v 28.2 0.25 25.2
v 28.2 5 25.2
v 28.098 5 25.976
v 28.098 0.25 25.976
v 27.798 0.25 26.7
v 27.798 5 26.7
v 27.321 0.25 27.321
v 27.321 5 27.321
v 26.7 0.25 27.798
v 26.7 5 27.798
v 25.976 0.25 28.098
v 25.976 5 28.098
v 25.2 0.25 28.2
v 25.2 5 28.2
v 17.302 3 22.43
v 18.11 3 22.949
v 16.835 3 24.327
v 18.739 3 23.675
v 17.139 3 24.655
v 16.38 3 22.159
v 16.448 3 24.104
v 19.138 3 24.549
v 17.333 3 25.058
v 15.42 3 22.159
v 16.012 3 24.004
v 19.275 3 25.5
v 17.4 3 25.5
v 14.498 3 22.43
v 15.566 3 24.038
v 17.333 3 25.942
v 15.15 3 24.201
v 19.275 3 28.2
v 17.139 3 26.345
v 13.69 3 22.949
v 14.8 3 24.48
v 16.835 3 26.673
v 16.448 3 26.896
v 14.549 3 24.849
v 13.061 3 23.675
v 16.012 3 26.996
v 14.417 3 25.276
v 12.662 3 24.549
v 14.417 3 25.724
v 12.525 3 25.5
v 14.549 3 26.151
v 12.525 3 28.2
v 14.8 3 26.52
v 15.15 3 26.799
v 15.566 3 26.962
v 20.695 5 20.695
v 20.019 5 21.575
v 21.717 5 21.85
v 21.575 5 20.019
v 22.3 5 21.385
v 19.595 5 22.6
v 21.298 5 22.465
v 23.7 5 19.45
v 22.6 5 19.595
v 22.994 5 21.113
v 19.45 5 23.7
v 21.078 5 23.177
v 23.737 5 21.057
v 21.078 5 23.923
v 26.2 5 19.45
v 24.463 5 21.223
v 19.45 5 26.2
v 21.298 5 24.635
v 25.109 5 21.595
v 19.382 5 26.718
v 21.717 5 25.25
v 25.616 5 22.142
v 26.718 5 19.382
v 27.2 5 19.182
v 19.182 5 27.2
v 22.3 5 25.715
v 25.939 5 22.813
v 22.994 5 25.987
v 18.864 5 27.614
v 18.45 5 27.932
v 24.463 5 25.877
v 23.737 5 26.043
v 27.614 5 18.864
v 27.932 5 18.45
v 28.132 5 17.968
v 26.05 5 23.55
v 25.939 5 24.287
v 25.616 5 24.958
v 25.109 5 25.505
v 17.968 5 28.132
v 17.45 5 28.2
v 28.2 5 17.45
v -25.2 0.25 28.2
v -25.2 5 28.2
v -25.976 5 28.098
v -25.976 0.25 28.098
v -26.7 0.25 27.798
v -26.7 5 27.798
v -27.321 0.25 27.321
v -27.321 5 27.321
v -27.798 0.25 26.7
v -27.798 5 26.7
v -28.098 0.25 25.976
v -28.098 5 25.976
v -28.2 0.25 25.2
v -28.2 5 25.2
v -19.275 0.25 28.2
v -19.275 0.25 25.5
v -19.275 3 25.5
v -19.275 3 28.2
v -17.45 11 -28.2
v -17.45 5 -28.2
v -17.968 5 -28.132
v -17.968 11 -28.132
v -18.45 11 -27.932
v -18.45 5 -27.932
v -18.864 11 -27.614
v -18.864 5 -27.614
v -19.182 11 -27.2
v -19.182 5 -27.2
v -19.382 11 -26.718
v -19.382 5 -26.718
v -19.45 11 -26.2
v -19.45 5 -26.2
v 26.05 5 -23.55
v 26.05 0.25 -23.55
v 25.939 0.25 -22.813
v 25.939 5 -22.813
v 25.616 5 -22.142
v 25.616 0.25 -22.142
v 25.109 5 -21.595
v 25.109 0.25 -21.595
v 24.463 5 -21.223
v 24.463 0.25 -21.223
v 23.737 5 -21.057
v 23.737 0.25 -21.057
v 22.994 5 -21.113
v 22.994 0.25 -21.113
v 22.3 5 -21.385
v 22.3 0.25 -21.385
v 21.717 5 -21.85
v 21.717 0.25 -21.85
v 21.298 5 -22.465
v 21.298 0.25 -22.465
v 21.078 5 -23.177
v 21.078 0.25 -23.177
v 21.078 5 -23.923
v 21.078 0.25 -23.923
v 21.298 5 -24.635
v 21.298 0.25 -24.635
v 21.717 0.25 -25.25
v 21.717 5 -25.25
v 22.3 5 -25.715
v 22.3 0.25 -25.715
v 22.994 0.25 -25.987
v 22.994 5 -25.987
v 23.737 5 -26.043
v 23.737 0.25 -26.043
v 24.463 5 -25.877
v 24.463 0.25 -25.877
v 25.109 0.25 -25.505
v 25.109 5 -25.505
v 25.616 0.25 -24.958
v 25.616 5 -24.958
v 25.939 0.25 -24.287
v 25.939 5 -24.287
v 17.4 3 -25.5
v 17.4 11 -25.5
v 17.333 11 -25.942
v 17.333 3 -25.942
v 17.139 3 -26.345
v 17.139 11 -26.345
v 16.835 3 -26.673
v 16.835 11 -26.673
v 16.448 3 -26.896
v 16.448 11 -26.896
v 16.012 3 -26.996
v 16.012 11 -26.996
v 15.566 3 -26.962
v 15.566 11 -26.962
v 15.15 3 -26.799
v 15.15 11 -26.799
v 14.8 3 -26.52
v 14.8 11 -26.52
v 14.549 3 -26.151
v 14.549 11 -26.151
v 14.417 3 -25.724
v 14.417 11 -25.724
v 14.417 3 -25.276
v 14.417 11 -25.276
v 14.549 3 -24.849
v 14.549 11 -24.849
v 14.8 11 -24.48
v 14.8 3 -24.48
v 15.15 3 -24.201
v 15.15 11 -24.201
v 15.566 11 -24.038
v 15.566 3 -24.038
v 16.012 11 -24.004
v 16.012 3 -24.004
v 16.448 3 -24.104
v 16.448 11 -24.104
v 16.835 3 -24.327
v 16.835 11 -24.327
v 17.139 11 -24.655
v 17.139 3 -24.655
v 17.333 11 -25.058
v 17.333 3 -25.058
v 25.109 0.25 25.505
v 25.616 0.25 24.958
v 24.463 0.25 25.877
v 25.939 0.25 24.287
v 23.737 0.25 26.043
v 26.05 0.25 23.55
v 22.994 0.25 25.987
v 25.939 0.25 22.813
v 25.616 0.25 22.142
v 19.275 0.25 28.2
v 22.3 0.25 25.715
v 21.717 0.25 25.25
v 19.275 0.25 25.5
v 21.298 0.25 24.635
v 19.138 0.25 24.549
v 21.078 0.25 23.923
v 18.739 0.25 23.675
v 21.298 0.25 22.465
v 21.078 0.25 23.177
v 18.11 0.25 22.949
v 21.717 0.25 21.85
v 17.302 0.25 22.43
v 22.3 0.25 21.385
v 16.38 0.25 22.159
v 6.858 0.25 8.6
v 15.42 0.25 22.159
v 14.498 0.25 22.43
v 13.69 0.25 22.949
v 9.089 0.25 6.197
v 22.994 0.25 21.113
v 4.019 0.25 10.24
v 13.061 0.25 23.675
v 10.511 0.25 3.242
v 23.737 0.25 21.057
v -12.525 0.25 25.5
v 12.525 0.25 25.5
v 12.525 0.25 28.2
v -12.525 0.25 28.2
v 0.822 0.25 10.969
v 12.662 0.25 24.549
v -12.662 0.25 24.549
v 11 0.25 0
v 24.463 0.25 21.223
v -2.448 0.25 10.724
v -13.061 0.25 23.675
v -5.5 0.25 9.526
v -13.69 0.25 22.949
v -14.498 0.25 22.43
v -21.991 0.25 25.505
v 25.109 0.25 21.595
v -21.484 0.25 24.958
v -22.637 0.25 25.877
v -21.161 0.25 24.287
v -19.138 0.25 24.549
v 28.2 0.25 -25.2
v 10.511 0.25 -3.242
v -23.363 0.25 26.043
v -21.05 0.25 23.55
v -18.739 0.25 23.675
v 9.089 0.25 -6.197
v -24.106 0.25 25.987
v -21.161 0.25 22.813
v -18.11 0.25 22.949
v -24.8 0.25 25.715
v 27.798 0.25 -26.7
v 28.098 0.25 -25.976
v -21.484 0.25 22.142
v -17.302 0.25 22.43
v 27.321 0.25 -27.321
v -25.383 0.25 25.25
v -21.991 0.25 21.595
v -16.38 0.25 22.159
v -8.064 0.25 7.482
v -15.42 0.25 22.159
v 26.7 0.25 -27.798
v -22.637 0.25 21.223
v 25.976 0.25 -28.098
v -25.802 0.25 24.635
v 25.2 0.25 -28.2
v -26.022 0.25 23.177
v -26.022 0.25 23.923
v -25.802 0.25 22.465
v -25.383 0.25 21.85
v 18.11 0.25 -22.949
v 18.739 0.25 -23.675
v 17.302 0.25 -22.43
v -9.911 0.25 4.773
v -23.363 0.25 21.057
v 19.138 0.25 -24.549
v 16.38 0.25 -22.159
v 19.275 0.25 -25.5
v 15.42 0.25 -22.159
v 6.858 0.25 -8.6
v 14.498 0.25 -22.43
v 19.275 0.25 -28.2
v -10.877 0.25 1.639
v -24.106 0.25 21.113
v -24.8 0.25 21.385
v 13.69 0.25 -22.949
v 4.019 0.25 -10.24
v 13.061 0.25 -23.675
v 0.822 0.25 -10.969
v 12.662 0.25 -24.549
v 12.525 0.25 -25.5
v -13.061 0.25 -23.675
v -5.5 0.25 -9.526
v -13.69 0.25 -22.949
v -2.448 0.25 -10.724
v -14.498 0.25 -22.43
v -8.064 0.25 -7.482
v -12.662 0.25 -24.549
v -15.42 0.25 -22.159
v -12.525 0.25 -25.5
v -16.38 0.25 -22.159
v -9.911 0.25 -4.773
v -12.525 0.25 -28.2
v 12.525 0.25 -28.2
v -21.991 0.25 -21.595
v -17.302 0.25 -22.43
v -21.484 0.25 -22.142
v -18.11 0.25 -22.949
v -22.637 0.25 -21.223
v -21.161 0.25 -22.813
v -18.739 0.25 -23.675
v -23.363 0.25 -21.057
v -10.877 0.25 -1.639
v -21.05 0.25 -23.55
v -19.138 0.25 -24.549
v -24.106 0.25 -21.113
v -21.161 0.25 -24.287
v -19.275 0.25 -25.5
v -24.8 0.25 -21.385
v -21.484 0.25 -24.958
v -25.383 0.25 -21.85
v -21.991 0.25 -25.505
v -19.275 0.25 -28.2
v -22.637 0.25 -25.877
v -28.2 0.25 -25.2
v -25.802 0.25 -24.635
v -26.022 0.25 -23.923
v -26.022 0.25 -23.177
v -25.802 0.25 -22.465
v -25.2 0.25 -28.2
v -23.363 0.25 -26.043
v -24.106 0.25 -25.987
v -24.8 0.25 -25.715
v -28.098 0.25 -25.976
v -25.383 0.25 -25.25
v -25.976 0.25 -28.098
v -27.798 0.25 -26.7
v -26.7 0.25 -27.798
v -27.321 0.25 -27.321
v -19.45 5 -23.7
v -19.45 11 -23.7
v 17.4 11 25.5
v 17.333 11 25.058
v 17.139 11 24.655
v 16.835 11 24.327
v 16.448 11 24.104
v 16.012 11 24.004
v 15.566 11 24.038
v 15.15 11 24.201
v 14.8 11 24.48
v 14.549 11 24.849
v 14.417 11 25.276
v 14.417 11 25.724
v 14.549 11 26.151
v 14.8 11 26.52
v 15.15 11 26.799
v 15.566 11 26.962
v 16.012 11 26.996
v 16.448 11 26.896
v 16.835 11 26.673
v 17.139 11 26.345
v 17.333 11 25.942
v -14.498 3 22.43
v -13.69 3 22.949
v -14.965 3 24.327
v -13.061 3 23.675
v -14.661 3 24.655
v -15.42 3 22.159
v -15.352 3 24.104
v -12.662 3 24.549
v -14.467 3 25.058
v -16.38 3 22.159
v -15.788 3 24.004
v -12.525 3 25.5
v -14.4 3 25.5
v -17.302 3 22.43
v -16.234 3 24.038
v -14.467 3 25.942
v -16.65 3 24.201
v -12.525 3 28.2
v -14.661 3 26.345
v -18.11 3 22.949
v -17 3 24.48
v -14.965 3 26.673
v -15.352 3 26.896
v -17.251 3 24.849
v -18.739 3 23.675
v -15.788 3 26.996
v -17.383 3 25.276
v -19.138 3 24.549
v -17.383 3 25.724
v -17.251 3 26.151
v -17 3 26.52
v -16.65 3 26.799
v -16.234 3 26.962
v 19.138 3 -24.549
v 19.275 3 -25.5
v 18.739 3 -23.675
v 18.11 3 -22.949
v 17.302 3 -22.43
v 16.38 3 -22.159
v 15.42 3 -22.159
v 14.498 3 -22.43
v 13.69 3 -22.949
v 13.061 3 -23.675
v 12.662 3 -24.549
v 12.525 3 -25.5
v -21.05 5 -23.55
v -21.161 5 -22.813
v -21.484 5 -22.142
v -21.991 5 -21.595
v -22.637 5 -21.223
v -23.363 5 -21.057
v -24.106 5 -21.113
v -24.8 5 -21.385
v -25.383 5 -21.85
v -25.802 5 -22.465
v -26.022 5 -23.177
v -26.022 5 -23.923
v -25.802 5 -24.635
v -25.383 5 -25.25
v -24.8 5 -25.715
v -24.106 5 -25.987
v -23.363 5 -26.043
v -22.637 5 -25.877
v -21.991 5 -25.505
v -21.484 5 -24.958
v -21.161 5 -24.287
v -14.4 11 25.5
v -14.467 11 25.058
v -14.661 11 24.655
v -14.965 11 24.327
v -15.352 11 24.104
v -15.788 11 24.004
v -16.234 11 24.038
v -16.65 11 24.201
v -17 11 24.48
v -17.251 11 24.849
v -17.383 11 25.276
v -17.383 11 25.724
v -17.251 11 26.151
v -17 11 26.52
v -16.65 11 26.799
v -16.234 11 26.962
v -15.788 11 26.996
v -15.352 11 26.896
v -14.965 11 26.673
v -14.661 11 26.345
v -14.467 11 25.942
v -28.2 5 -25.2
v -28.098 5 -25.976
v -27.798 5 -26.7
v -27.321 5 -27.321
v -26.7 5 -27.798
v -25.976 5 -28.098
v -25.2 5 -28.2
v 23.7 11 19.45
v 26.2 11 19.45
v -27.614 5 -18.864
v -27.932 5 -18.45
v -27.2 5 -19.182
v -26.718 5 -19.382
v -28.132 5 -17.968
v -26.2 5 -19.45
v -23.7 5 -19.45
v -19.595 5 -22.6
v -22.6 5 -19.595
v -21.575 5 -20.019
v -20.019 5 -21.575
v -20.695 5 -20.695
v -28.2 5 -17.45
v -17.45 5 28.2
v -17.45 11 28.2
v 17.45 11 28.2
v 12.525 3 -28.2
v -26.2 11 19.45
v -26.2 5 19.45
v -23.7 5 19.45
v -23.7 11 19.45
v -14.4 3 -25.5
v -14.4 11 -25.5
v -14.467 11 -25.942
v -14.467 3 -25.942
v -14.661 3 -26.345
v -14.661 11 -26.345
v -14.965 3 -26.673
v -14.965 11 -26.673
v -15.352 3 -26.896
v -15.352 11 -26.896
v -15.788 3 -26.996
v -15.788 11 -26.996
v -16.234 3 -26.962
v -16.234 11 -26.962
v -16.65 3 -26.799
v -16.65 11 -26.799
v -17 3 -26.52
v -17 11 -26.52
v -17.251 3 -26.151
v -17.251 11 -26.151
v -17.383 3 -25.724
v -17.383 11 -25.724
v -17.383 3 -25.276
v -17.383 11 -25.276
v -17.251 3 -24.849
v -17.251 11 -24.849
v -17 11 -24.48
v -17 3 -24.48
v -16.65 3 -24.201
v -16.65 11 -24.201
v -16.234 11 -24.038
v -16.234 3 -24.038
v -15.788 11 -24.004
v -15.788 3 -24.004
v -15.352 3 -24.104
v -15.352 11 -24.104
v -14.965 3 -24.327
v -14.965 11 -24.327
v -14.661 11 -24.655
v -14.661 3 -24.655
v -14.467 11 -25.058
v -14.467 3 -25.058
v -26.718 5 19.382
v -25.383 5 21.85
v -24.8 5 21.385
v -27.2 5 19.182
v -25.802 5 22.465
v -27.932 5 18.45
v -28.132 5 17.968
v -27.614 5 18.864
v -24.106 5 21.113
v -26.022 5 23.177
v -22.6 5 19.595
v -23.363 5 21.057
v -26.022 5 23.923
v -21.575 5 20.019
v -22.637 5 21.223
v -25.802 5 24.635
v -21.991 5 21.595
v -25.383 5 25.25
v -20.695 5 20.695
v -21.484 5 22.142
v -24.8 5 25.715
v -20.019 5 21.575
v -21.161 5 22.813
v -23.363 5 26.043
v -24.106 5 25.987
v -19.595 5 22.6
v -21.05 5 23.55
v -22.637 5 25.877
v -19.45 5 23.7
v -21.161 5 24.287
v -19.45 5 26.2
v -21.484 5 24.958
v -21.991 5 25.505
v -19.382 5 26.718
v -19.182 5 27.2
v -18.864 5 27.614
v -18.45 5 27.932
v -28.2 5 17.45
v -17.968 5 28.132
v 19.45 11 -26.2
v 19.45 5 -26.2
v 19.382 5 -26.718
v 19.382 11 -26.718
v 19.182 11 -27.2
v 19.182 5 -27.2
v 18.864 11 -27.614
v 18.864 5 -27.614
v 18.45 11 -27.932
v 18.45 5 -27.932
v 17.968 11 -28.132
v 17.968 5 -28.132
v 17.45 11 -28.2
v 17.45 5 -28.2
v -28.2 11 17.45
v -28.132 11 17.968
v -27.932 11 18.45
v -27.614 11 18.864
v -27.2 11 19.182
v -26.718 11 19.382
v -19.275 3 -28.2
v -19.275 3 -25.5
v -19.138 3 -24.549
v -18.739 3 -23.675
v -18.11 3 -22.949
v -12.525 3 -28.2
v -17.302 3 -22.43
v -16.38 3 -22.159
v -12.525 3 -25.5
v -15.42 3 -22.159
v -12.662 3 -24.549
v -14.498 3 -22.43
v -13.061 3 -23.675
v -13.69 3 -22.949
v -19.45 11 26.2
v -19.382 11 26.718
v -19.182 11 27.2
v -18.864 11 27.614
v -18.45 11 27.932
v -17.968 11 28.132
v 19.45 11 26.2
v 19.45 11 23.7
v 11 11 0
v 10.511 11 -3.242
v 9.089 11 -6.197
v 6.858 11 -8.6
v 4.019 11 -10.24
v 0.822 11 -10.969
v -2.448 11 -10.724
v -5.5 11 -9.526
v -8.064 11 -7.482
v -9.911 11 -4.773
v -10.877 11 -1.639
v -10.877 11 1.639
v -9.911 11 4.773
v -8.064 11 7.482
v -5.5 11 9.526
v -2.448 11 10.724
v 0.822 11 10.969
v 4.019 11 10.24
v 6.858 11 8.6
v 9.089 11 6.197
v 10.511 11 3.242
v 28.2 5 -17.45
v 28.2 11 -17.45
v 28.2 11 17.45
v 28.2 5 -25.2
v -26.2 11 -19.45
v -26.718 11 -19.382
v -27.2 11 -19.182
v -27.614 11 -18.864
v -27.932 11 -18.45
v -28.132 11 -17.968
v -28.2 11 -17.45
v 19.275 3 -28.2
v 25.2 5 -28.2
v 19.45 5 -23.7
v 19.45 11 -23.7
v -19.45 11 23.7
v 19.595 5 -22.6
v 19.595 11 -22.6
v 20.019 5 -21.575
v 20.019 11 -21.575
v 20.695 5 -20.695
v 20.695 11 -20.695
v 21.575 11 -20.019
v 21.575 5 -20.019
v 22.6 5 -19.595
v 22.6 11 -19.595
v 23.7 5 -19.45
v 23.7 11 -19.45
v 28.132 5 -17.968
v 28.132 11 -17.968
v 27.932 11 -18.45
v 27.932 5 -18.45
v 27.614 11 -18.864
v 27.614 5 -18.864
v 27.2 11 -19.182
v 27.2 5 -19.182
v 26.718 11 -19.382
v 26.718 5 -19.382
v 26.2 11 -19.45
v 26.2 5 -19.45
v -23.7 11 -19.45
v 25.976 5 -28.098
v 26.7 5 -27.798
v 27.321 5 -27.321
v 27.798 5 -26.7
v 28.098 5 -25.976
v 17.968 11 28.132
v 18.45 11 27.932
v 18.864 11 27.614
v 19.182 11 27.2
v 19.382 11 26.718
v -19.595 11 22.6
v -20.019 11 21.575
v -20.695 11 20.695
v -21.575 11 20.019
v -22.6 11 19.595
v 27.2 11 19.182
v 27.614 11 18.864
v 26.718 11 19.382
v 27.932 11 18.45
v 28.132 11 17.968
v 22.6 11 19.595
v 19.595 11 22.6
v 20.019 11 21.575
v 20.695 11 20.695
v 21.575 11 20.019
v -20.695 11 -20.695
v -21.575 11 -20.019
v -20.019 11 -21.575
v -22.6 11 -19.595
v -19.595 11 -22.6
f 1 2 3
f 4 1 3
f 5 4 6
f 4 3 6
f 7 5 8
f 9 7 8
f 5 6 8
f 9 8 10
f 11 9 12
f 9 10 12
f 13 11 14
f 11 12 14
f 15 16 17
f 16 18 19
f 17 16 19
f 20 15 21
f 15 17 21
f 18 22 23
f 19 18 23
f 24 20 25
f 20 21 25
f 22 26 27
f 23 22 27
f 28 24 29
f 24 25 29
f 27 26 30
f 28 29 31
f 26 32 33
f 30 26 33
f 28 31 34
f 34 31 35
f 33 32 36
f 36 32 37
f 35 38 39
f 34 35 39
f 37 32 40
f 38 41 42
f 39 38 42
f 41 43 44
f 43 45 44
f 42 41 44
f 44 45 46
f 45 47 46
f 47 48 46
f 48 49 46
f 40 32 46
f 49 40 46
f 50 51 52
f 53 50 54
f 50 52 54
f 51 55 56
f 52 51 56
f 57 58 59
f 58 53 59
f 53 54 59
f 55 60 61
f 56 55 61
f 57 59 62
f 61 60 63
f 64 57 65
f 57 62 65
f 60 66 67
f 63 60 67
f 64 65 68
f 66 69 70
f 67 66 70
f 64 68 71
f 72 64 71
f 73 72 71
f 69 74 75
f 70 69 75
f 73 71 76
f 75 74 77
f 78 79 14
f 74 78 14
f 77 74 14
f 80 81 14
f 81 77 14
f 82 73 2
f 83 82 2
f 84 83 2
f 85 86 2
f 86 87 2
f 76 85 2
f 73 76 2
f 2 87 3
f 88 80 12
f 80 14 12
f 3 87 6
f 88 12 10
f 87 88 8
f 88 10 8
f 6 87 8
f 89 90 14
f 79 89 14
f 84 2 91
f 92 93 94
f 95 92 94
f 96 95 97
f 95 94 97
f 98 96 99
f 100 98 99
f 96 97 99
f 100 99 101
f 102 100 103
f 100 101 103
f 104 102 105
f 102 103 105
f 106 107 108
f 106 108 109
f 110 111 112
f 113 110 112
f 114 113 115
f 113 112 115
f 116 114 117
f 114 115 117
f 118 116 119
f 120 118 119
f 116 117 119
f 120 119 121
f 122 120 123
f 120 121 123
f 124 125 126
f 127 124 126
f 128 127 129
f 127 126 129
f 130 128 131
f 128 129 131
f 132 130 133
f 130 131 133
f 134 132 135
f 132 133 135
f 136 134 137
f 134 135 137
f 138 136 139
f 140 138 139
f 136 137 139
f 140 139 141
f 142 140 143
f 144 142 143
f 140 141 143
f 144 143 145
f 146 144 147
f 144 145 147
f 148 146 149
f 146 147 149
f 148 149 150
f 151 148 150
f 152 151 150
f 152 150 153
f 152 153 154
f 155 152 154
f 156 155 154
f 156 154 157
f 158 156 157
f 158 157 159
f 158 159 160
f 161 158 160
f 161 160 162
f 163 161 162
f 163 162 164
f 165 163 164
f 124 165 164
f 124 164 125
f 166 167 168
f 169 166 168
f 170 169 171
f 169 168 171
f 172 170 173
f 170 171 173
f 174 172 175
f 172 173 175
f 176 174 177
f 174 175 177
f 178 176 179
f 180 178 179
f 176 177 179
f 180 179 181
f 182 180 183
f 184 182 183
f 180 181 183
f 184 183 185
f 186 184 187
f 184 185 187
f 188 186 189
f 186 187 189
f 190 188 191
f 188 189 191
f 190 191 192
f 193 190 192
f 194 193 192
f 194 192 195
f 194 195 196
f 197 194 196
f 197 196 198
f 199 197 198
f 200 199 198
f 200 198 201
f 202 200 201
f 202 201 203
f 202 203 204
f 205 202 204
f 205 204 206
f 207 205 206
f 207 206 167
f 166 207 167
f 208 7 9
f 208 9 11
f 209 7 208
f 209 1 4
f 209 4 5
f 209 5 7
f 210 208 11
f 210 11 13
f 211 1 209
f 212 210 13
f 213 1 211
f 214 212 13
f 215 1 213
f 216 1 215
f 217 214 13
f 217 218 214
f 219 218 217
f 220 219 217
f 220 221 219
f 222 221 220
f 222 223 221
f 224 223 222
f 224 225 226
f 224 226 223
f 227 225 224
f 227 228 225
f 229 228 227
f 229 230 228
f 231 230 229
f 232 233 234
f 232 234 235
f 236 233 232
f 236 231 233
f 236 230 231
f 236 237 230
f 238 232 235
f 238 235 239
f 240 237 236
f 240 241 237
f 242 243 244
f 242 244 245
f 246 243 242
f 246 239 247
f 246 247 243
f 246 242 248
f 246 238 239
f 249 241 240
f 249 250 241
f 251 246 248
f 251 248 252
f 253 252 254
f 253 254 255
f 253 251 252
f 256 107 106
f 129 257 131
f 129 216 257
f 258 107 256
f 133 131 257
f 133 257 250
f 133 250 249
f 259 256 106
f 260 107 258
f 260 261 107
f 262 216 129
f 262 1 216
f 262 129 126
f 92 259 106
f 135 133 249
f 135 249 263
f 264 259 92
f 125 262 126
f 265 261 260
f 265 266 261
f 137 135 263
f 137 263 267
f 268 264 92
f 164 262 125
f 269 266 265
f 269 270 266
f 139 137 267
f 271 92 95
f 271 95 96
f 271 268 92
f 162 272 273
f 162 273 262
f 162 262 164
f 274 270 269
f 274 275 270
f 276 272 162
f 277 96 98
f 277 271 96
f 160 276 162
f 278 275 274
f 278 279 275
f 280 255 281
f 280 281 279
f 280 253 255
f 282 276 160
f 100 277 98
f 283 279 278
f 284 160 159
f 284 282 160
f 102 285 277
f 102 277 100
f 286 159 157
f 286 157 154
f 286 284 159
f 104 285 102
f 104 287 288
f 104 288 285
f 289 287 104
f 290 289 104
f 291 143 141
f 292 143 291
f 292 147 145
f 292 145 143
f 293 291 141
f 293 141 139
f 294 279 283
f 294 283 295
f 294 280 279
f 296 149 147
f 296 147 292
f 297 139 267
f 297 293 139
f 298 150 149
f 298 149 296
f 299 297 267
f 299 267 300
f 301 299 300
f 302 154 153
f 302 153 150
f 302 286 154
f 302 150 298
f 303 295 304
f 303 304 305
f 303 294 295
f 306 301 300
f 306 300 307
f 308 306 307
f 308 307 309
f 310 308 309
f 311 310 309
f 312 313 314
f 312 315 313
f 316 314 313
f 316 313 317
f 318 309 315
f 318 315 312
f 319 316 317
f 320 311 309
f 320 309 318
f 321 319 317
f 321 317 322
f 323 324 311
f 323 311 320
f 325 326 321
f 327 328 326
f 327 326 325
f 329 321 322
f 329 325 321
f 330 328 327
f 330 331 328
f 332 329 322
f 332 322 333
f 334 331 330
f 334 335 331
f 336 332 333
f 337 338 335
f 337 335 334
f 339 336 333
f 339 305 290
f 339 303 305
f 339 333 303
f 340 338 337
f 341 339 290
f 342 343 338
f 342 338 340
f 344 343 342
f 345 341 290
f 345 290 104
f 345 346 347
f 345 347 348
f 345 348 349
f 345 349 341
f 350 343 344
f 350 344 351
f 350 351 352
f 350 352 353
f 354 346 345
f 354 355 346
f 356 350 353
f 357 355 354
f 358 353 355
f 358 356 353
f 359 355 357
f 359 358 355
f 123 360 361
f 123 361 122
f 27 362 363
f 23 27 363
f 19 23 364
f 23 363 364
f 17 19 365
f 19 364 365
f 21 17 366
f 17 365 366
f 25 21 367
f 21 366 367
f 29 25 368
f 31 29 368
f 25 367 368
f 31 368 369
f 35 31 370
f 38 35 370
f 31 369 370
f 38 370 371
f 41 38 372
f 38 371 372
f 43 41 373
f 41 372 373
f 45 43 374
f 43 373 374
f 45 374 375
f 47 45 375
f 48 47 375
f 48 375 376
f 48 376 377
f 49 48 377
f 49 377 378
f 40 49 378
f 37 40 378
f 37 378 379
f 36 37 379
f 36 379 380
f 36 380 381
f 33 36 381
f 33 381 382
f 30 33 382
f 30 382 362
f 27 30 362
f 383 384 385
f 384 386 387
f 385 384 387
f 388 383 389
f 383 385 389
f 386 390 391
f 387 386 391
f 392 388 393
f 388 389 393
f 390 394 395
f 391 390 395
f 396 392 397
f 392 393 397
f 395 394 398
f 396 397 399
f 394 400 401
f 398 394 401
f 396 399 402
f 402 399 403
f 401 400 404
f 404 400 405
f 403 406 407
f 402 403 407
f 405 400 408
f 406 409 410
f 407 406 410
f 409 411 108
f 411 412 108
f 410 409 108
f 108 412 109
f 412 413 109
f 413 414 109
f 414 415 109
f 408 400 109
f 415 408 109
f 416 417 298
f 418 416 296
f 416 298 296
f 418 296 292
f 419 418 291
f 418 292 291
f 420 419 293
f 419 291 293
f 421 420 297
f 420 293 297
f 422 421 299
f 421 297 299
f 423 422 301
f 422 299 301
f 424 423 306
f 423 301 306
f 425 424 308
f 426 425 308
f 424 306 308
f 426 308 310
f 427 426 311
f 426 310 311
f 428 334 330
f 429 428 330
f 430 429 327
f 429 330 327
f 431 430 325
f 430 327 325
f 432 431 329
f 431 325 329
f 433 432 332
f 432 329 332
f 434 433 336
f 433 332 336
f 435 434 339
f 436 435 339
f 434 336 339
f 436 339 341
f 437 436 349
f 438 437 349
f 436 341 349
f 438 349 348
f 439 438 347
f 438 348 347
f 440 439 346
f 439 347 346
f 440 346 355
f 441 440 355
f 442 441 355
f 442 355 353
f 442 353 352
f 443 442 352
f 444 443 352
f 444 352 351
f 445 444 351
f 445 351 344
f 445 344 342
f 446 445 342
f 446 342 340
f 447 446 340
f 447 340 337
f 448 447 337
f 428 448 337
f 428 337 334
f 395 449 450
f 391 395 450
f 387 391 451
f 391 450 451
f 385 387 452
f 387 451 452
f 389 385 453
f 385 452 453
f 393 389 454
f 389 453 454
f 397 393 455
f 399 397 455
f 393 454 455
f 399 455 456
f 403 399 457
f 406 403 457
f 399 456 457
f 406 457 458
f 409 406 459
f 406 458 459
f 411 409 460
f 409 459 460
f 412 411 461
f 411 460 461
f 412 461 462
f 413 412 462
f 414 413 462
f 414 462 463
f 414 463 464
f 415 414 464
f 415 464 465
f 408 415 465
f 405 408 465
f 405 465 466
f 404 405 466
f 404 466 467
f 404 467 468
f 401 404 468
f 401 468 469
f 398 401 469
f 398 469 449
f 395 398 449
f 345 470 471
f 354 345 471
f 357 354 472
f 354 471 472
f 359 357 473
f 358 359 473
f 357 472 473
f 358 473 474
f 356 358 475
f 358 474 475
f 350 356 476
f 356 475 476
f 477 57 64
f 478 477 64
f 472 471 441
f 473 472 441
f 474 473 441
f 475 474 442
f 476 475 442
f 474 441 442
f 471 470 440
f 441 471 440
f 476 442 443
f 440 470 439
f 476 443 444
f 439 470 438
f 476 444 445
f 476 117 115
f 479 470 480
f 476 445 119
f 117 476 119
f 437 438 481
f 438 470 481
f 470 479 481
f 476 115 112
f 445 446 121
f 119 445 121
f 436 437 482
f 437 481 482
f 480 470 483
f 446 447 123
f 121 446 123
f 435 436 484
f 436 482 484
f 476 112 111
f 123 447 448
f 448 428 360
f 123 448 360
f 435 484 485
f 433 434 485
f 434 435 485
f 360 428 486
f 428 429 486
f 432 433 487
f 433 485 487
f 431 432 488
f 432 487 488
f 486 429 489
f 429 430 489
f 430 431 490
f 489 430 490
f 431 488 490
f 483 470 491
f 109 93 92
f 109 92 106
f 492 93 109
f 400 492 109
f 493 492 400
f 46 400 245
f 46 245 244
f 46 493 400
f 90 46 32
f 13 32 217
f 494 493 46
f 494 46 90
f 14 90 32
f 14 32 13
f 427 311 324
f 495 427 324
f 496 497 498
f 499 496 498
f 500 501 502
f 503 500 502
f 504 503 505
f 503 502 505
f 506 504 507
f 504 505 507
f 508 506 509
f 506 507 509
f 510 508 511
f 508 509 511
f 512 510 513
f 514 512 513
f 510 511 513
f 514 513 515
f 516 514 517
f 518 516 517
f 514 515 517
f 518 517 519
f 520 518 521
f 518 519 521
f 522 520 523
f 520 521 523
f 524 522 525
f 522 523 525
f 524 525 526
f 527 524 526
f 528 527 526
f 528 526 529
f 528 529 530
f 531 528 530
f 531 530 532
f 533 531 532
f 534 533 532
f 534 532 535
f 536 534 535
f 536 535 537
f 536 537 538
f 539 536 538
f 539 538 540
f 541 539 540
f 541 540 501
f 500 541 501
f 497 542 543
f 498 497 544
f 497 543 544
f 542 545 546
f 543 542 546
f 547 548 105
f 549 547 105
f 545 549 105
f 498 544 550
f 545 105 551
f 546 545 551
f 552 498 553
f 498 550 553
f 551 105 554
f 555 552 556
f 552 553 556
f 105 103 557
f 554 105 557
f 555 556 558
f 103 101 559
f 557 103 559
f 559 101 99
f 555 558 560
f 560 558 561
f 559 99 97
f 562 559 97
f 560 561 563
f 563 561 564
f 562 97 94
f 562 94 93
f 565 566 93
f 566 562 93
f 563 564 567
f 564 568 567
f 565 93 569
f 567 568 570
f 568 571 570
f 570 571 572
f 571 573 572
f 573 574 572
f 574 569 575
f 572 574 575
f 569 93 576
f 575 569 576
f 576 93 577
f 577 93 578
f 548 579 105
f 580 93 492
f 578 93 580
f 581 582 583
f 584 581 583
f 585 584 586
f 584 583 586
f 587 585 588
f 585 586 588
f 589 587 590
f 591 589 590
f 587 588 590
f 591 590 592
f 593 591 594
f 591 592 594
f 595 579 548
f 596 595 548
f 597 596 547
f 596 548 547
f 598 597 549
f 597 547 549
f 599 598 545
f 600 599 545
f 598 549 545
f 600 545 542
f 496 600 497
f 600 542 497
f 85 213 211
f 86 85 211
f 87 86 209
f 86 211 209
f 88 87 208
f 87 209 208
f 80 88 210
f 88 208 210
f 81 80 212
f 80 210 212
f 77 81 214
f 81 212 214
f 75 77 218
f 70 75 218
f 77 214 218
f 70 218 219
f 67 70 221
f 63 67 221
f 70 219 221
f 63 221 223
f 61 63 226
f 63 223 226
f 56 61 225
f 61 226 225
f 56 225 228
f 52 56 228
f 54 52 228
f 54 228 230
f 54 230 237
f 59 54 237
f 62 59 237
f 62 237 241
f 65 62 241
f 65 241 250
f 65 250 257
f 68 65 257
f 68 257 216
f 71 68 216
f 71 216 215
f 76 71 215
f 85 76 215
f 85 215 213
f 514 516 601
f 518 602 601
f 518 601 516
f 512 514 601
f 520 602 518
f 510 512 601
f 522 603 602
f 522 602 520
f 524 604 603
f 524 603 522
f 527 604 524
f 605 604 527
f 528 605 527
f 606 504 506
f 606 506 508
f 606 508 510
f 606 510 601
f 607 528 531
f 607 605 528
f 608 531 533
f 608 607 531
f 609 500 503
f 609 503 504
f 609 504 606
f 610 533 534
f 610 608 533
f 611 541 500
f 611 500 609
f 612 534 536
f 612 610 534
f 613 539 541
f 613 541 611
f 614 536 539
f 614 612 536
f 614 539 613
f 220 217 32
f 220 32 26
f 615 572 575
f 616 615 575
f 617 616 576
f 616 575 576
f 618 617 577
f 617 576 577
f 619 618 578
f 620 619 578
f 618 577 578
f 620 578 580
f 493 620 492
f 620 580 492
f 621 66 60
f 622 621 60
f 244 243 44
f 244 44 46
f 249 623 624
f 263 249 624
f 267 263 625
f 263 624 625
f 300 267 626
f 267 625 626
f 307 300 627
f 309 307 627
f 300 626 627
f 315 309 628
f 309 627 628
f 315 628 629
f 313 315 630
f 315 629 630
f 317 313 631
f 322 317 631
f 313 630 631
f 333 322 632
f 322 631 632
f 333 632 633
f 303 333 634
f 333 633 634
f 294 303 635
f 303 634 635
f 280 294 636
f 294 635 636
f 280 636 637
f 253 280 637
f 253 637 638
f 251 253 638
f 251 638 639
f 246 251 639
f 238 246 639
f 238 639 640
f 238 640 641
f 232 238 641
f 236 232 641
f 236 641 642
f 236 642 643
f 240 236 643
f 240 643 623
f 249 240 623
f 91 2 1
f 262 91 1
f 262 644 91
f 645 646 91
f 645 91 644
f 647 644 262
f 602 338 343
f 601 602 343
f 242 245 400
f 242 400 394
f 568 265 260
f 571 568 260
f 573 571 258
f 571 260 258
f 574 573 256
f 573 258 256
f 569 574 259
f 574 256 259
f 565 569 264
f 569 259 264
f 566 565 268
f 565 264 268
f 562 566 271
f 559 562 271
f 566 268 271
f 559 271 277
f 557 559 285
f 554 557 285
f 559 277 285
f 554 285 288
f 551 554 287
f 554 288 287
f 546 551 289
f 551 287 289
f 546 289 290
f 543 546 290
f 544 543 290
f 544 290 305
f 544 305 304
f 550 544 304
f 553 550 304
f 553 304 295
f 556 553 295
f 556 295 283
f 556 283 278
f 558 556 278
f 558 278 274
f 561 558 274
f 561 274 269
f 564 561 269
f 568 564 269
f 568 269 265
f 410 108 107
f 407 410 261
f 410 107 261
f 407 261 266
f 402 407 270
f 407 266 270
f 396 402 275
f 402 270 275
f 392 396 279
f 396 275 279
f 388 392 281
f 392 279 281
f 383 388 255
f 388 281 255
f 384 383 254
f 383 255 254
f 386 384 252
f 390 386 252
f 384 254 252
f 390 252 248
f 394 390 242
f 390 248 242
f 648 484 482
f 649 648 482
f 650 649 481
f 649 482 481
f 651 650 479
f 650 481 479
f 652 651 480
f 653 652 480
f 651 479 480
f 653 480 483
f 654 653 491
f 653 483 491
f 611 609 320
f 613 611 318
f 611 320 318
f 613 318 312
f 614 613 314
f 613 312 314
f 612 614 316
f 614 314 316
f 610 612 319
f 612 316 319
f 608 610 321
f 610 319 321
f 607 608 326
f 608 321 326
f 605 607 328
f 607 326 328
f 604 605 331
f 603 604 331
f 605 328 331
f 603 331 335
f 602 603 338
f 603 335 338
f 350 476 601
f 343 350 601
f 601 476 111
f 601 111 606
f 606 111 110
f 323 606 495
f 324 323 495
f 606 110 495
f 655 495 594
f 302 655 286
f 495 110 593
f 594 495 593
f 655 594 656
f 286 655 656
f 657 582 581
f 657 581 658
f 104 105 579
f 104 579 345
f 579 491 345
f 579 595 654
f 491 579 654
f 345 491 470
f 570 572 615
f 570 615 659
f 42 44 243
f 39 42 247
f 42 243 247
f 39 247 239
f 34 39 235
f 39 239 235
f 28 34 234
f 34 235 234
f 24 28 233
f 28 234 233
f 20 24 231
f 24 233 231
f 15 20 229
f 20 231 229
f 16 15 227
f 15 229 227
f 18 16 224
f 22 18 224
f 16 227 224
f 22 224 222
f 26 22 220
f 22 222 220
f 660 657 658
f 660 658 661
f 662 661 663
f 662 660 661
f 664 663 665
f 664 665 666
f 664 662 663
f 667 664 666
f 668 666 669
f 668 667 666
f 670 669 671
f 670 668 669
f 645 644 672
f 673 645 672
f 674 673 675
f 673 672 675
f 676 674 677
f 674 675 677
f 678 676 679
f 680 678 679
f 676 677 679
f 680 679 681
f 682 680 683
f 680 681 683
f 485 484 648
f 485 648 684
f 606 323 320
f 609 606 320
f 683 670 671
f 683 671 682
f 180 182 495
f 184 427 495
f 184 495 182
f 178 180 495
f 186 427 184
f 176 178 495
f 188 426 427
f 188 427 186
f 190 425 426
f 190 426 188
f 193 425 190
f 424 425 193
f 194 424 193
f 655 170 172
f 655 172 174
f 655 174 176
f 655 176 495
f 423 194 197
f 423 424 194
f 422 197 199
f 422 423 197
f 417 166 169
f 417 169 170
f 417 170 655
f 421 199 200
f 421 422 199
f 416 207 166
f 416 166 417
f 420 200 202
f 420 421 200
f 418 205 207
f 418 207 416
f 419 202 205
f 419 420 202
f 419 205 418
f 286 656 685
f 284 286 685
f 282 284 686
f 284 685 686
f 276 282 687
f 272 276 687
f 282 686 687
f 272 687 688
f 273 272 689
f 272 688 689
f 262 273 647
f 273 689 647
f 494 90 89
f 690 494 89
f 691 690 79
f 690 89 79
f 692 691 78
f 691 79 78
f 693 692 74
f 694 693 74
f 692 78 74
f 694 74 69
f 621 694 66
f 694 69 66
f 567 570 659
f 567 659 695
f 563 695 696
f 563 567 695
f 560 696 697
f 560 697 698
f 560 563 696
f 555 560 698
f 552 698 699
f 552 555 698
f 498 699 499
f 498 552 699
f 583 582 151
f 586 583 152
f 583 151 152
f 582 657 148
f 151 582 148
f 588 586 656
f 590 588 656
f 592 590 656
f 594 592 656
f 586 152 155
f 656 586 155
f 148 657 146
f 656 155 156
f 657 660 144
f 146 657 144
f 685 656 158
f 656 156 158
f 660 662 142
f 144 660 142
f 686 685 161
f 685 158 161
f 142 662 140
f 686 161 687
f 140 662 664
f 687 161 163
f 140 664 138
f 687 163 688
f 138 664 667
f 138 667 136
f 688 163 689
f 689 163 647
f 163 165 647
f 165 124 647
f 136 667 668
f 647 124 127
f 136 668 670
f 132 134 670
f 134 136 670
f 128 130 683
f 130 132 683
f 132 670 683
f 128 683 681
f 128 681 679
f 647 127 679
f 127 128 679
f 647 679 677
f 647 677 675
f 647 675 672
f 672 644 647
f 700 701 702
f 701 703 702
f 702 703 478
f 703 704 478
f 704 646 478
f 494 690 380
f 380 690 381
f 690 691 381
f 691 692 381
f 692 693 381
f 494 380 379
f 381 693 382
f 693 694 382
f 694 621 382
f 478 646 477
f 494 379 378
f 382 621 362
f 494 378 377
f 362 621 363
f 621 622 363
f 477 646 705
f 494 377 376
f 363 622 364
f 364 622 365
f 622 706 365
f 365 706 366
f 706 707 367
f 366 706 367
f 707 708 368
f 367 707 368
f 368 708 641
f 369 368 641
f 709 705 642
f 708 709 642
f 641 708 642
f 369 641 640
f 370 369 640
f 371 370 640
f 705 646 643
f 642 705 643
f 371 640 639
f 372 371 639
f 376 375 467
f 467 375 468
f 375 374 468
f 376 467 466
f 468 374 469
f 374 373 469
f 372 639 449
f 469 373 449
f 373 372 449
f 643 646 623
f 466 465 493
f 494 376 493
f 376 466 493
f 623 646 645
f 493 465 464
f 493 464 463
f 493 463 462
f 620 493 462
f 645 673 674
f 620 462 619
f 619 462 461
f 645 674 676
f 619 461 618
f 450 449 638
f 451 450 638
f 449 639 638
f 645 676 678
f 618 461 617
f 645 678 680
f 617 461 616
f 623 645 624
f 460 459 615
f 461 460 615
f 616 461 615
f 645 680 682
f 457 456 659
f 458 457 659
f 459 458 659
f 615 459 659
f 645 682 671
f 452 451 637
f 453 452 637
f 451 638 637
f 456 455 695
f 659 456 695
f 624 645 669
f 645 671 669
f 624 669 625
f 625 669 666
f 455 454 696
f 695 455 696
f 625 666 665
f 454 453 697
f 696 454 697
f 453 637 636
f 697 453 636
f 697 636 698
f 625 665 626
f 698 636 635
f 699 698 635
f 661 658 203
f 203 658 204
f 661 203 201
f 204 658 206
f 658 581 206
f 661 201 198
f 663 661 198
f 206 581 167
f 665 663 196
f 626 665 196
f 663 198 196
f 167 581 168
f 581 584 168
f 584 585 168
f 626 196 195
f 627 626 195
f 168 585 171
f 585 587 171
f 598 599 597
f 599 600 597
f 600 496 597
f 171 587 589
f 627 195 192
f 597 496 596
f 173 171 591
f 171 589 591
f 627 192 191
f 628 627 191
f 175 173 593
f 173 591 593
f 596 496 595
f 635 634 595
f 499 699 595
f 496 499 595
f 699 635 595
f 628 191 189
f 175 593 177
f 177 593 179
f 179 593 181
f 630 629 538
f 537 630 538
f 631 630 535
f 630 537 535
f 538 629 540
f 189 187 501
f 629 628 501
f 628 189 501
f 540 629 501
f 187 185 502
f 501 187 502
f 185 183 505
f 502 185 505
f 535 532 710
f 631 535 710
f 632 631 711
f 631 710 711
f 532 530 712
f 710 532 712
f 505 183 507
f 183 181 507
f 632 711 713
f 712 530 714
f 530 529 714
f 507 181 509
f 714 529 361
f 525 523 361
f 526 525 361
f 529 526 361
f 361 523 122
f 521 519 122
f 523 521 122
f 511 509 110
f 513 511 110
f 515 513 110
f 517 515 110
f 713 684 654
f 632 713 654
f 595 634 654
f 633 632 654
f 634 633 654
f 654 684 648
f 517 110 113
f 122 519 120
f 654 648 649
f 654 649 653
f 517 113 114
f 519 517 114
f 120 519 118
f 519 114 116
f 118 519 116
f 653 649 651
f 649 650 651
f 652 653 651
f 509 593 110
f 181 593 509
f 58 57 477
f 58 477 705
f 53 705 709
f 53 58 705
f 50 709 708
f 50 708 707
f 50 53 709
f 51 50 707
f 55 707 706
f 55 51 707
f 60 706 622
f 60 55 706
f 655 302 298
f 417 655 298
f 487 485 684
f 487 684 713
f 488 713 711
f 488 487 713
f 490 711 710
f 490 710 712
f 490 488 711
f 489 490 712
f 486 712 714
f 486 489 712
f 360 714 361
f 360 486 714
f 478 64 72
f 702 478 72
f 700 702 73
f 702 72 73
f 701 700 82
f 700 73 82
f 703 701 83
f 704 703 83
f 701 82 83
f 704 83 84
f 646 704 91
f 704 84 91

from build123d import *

# Parameters (mm, degrees)
SKETCH003_R          = 5.5
PAD002_DEPTH         = 6
SKETCH_R             = 5.5
PAD_DEPTH            = 5
SKETCH005_R          = 19.05
SKETCH005_R_2        = 5.5
PAD004_DEPTH         = 1.1
SKETCH006_R          = 2.5
POCKET_DEPTH         = 11.001
SKETCH007_R          = 1.5
POCKET001_DEPTH      = 12.101
POCKET004_DEPTH      = 3
SKETCH018_R          = 11
POCKET009_DEPTH      = 11
POCKET009_FACE32_R   = 2.5
POCKET009_FACE32_R_2 = 19.05
POCKET014_DEPTH      = 0.25
POCKET014_FACE62_R   = 19.05
POCKET014_FACE62_R_2 = 5.5
POCKET021_DEPTH      = 1.35


with BuildPart() as part:
    # Sketch003 → Pad002 (new body)
    with BuildSketch(Plane(origin=(0, 5, 0), x_dir=(1, 0, 0), z_dir=(0, 1, 0))):
        with BuildLine():
            Line((-26.2, 19.45), (-23.7, 19.45))
            ThreePointArc((-23.7, 19.45), (-20.694796, 20.694796), (-19.45, 23.7))
            Line((-19.45, 23.7), (-19.45, 26.2))
            ThreePointArc((-17.45, 28.2), (-18.864214, 27.614214), (-19.45, 26.2))
            Line((-17.45, 28.2), (17.45, 28.2))
            ThreePointArc((19.45, 26.2), (18.864214, 27.614214), (17.45, 28.2))
            Line((19.45, 26.2), (19.45, 23.7))
            ThreePointArc((19.45, 23.7), (20.694796, 20.694796), (23.7, 19.45))
            Line((23.7, 19.45), (26.2, 19.45))
            ThreePointArc((28.2, 17.45), (27.614214, 18.864214), (26.2, 19.45))
            Line((28.2, 17.45), (28.2, -17.45))
            ThreePointArc((26.2, -19.45), (27.614214, -18.864214), (28.2, -17.45))
            Line((23.7, -19.45), (26.2, -19.45))
            ThreePointArc((23.7, -19.45), (20.694796, -20.694796), (19.45, -23.7))
            Line((19.45, -26.2), (19.45, -23.7))
            ThreePointArc((17.45, -28.2), (18.864214, -27.614214), (19.45, -26.2))
            Line((-17.45, -28.2), (17.45, -28.2))
            ThreePointArc((-19.45, -26.2), (-18.864214, -27.614214), (-17.45, -28.2))
            Line((-19.45, -26.2), (-19.45, -23.7))
            ThreePointArc((-19.45, -23.7), (-20.694796, -20.694796), (-23.7, -19.45))
            Line((-26.2, -19.45), (-23.7, -19.45))
            ThreePointArc((-28.2, -17.45), (-27.614214, -18.864214), (-26.2, -19.45))
            Line((-28.2, 17.45), (-28.2, -17.45))
            ThreePointArc((-26.2, 19.45), (-27.614214, 18.864214), (-28.2, 17.45))
        make_face()
        Circle(SKETCH003_R, mode=Mode.SUBTRACT)
    extrude(amount=PAD002_DEPTH)

    # Sketch (on Face26 of Pad002) → Pad (join)
    with BuildSketch(Plane.XZ.offset(-5)):
        with BuildLine():
            Line((-28.2, 25.2), (-28.2, -25.2))
            ThreePointArc((-28.2, -25.2), (-27.32132, -27.32132), (-25.2, -28.2))
            Line((-25.2, -28.2), (25.2, -28.2))
            ThreePointArc((25.2, -28.2), (27.32132, -27.32132), (28.2, -25.2))
            Line((28.2, 25.2), (28.2, -25.2))
            ThreePointArc((28.2, 25.2), (27.32132, 27.32132), (25.2, 28.2))
            Line((-25.2, 28.2), (25.2, 28.2))
            ThreePointArc((-25.2, 28.2), (-27.32132, 27.32132), (-28.2, 25.2))
        make_face()
        Circle(SKETCH_R, mode=Mode.SUBTRACT)
    extrude(amount=PAD_DEPTH)

    # Sketch005 (on Face33 of Pad) → Pad004 (join)
    with BuildSketch(Plane.XZ):
        Circle(SKETCH005_R)
        Circle(SKETCH005_R_2, mode=Mode.SUBTRACT)
    extrude(amount=PAD004_DEPTH)

    # Sketch006 (on Face33 of Pad004) → Pocket (cut, through all)
    with BuildSketch(Plane.XZ):
        with Locations((-23.55, 23.55)):
            Circle(SKETCH006_R)
        with Locations((23.55, 23.55)):
            Circle(SKETCH006_R)
        with Locations((23.55, -23.55)):
            Circle(SKETCH006_R)
        with Locations((-23.55, -23.55)):
            Circle(SKETCH006_R)
    extrude(amount=-POCKET_DEPTH, mode=Mode.SUBTRACT)

    # Sketch007 (on Face5 of Pocket) → Pocket001 (cut, through all)
    with BuildSketch(Plane(origin=(0, 11, 0), x_dir=(1, 0, 0), z_dir=(0, 1, 0))):
        with Locations((-15.9, 25.5)):
            Circle(SKETCH007_R)
        with Locations((15.9, 25.5)):
            Circle(SKETCH007_R)
        with Locations((-15.9, -25.5)):
            Circle(SKETCH007_R)
        with Locations((15.9, -25.5)):
            Circle(SKETCH007_R)
    extrude(amount=-POCKET001_DEPTH, mode=Mode.SUBTRACT)

    # Sketch012 (on Face38 of Pocket001) → Pocket004 (cut)
    with BuildSketch(Plane.XZ):
        with BuildLine():
            Line((-19.275, -25.5), (-19.275, -30.5))
            Line((-19.275, -30.5), (-12.525, -30.5))
            Line((-12.525, -30.5), (-12.525, -25.5))
            ThreePointArc((-12.525, -25.5), (-15.9, -22.125), (-19.275, -25.5))
        make_face()
        with BuildLine():
            Line((12.525, -25.5), (12.525, -30.5))
            Line((12.525, -30.5), (19.275, -30.5))
            Line((19.275, -30.5), (19.275, -25.5))
            ThreePointArc((19.275, -25.5), (15.9, -22.125), (12.525, -25.5))
        make_face()
        with BuildLine():
            Line((-19.275, 25.5), (-19.275, 30.5))
            Line((-19.275, 30.5), (-12.525, 30.5))
            Line((-12.525, 30.5), (-12.525, 25.5))
            ThreePointArc((-19.275, 25.5), (-15.9, 22.125), (-12.525, 25.5))
        make_face()
        with BuildLine():
            Line((12.525, 25.5), (12.525, 30.5))
            Line((12.525, 30.5), (19.275, 30.5))
            Line((19.275, 30.5), (19.275, 25.5))
            ThreePointArc((12.525, 25.5), (15.9, 22.125), (19.275, 25.5))
        make_face()
    extrude(amount=-POCKET004_DEPTH, mode=Mode.SUBTRACT)

    # Sketch018 (on Face5 of Pocket004) → Pocket009 (cut)
    with BuildSketch(Plane(origin=(0, 11, 0), x_dir=(1, 0, 0), z_dir=(0, 1, 0))):
        Circle(SKETCH018_R)
    extrude(amount=-POCKET009_DEPTH, mode=Mode.SUBTRACT)

    # Pocket009 Face32 → Pocket014 (cut)
    with BuildSketch(Plane(origin=(0, 0, 0), x_dir=(-1, 0, 0), z_dir=(0, -1, 0))):
        with BuildLine():
            Line((19.275, -28.2), (25.2, -28.2))
            ThreePointArc((25.2, -28.2), (27.32132, -27.32132), (28.2, -25.2))
            Line((28.2, -25.2), (28.2, 25.2))
            ThreePointArc((28.2, 25.2), (27.32132, 27.32132), (25.2, 28.2))
            Line((25.2, 28.2), (19.275, 28.2))
            Line((19.275, 28.2), (19.275, 25.5))
            ThreePointArc((19.275, 25.5), (15.9, 22.125), (12.525, 25.5))
            Line((12.525, 25.5), (12.525, 28.2))
            Line((12.525, 28.2), (-12.525, 28.2))
            Line((-12.525, 28.2), (-12.525, 25.5))
            ThreePointArc((-12.525, 25.5), (-15.9, 22.125), (-19.275, 25.5))
            Line((-19.275, 25.5), (-19.275, 28.2))
            Line((-19.275, 28.2), (-25.2, 28.2))
            ThreePointArc((-25.2, 28.2), (-27.32132, 27.32132), (-28.2, 25.2))
            Line((-28.2, 25.2), (-28.2, -25.2))
            ThreePointArc((-28.2, -25.2), (-27.32132, -27.32132), (-25.2, -28.2))
            Line((-25.2, -28.2), (-19.275, -28.2))
            Line((-19.275, -28.2), (-19.275, -25.5))
            ThreePointArc((-19.275, -25.5), (-15.9, -22.125), (-12.525, -25.5))
            Line((-12.525, -25.5), (-12.525, -28.2))
            Line((-12.525, -28.2), (12.525, -28.2))
            Line((12.525, -28.2), (12.525, -25.5))
            ThreePointArc((12.525, -25.5), (15.9, -22.125), (19.275, -25.5))
            Line((19.275, -25.5), (19.275, -28.2))
        make_face()
        with Locations((23.55, -23.55)):
            Circle(POCKET009_FACE32_R, mode=Mode.SUBTRACT)
        with Locations((23.55, 23.55)):
            Circle(POCKET009_FACE32_R, mode=Mode.SUBTRACT)
        Circle(POCKET009_FACE32_R_2, mode=Mode.SUBTRACT)
        with Locations((-23.55, -23.55)):
            Circle(POCKET009_FACE32_R, mode=Mode.SUBTRACT)
        with Locations((-23.55, 23.55)):
            Circle(POCKET009_FACE32_R, mode=Mode.SUBTRACT)
    extrude(amount=-POCKET014_DEPTH, mode=Mode.SUBTRACT)

    # Pocket014 Face62 → Pocket021 (cut)
    with BuildSketch(Plane(origin=(0, -1.1, 0), x_dir=(-1, 0, 0), z_dir=(0, -1, 0))):
        Circle(POCKET014_FACE62_R)
        Circle(POCKET014_FACE62_R_2, mode=Mode.SUBTRACT)
    extrude(amount=-POCKET021_DEPTH, mode=Mode.SUBTRACT)


solid = part.part
